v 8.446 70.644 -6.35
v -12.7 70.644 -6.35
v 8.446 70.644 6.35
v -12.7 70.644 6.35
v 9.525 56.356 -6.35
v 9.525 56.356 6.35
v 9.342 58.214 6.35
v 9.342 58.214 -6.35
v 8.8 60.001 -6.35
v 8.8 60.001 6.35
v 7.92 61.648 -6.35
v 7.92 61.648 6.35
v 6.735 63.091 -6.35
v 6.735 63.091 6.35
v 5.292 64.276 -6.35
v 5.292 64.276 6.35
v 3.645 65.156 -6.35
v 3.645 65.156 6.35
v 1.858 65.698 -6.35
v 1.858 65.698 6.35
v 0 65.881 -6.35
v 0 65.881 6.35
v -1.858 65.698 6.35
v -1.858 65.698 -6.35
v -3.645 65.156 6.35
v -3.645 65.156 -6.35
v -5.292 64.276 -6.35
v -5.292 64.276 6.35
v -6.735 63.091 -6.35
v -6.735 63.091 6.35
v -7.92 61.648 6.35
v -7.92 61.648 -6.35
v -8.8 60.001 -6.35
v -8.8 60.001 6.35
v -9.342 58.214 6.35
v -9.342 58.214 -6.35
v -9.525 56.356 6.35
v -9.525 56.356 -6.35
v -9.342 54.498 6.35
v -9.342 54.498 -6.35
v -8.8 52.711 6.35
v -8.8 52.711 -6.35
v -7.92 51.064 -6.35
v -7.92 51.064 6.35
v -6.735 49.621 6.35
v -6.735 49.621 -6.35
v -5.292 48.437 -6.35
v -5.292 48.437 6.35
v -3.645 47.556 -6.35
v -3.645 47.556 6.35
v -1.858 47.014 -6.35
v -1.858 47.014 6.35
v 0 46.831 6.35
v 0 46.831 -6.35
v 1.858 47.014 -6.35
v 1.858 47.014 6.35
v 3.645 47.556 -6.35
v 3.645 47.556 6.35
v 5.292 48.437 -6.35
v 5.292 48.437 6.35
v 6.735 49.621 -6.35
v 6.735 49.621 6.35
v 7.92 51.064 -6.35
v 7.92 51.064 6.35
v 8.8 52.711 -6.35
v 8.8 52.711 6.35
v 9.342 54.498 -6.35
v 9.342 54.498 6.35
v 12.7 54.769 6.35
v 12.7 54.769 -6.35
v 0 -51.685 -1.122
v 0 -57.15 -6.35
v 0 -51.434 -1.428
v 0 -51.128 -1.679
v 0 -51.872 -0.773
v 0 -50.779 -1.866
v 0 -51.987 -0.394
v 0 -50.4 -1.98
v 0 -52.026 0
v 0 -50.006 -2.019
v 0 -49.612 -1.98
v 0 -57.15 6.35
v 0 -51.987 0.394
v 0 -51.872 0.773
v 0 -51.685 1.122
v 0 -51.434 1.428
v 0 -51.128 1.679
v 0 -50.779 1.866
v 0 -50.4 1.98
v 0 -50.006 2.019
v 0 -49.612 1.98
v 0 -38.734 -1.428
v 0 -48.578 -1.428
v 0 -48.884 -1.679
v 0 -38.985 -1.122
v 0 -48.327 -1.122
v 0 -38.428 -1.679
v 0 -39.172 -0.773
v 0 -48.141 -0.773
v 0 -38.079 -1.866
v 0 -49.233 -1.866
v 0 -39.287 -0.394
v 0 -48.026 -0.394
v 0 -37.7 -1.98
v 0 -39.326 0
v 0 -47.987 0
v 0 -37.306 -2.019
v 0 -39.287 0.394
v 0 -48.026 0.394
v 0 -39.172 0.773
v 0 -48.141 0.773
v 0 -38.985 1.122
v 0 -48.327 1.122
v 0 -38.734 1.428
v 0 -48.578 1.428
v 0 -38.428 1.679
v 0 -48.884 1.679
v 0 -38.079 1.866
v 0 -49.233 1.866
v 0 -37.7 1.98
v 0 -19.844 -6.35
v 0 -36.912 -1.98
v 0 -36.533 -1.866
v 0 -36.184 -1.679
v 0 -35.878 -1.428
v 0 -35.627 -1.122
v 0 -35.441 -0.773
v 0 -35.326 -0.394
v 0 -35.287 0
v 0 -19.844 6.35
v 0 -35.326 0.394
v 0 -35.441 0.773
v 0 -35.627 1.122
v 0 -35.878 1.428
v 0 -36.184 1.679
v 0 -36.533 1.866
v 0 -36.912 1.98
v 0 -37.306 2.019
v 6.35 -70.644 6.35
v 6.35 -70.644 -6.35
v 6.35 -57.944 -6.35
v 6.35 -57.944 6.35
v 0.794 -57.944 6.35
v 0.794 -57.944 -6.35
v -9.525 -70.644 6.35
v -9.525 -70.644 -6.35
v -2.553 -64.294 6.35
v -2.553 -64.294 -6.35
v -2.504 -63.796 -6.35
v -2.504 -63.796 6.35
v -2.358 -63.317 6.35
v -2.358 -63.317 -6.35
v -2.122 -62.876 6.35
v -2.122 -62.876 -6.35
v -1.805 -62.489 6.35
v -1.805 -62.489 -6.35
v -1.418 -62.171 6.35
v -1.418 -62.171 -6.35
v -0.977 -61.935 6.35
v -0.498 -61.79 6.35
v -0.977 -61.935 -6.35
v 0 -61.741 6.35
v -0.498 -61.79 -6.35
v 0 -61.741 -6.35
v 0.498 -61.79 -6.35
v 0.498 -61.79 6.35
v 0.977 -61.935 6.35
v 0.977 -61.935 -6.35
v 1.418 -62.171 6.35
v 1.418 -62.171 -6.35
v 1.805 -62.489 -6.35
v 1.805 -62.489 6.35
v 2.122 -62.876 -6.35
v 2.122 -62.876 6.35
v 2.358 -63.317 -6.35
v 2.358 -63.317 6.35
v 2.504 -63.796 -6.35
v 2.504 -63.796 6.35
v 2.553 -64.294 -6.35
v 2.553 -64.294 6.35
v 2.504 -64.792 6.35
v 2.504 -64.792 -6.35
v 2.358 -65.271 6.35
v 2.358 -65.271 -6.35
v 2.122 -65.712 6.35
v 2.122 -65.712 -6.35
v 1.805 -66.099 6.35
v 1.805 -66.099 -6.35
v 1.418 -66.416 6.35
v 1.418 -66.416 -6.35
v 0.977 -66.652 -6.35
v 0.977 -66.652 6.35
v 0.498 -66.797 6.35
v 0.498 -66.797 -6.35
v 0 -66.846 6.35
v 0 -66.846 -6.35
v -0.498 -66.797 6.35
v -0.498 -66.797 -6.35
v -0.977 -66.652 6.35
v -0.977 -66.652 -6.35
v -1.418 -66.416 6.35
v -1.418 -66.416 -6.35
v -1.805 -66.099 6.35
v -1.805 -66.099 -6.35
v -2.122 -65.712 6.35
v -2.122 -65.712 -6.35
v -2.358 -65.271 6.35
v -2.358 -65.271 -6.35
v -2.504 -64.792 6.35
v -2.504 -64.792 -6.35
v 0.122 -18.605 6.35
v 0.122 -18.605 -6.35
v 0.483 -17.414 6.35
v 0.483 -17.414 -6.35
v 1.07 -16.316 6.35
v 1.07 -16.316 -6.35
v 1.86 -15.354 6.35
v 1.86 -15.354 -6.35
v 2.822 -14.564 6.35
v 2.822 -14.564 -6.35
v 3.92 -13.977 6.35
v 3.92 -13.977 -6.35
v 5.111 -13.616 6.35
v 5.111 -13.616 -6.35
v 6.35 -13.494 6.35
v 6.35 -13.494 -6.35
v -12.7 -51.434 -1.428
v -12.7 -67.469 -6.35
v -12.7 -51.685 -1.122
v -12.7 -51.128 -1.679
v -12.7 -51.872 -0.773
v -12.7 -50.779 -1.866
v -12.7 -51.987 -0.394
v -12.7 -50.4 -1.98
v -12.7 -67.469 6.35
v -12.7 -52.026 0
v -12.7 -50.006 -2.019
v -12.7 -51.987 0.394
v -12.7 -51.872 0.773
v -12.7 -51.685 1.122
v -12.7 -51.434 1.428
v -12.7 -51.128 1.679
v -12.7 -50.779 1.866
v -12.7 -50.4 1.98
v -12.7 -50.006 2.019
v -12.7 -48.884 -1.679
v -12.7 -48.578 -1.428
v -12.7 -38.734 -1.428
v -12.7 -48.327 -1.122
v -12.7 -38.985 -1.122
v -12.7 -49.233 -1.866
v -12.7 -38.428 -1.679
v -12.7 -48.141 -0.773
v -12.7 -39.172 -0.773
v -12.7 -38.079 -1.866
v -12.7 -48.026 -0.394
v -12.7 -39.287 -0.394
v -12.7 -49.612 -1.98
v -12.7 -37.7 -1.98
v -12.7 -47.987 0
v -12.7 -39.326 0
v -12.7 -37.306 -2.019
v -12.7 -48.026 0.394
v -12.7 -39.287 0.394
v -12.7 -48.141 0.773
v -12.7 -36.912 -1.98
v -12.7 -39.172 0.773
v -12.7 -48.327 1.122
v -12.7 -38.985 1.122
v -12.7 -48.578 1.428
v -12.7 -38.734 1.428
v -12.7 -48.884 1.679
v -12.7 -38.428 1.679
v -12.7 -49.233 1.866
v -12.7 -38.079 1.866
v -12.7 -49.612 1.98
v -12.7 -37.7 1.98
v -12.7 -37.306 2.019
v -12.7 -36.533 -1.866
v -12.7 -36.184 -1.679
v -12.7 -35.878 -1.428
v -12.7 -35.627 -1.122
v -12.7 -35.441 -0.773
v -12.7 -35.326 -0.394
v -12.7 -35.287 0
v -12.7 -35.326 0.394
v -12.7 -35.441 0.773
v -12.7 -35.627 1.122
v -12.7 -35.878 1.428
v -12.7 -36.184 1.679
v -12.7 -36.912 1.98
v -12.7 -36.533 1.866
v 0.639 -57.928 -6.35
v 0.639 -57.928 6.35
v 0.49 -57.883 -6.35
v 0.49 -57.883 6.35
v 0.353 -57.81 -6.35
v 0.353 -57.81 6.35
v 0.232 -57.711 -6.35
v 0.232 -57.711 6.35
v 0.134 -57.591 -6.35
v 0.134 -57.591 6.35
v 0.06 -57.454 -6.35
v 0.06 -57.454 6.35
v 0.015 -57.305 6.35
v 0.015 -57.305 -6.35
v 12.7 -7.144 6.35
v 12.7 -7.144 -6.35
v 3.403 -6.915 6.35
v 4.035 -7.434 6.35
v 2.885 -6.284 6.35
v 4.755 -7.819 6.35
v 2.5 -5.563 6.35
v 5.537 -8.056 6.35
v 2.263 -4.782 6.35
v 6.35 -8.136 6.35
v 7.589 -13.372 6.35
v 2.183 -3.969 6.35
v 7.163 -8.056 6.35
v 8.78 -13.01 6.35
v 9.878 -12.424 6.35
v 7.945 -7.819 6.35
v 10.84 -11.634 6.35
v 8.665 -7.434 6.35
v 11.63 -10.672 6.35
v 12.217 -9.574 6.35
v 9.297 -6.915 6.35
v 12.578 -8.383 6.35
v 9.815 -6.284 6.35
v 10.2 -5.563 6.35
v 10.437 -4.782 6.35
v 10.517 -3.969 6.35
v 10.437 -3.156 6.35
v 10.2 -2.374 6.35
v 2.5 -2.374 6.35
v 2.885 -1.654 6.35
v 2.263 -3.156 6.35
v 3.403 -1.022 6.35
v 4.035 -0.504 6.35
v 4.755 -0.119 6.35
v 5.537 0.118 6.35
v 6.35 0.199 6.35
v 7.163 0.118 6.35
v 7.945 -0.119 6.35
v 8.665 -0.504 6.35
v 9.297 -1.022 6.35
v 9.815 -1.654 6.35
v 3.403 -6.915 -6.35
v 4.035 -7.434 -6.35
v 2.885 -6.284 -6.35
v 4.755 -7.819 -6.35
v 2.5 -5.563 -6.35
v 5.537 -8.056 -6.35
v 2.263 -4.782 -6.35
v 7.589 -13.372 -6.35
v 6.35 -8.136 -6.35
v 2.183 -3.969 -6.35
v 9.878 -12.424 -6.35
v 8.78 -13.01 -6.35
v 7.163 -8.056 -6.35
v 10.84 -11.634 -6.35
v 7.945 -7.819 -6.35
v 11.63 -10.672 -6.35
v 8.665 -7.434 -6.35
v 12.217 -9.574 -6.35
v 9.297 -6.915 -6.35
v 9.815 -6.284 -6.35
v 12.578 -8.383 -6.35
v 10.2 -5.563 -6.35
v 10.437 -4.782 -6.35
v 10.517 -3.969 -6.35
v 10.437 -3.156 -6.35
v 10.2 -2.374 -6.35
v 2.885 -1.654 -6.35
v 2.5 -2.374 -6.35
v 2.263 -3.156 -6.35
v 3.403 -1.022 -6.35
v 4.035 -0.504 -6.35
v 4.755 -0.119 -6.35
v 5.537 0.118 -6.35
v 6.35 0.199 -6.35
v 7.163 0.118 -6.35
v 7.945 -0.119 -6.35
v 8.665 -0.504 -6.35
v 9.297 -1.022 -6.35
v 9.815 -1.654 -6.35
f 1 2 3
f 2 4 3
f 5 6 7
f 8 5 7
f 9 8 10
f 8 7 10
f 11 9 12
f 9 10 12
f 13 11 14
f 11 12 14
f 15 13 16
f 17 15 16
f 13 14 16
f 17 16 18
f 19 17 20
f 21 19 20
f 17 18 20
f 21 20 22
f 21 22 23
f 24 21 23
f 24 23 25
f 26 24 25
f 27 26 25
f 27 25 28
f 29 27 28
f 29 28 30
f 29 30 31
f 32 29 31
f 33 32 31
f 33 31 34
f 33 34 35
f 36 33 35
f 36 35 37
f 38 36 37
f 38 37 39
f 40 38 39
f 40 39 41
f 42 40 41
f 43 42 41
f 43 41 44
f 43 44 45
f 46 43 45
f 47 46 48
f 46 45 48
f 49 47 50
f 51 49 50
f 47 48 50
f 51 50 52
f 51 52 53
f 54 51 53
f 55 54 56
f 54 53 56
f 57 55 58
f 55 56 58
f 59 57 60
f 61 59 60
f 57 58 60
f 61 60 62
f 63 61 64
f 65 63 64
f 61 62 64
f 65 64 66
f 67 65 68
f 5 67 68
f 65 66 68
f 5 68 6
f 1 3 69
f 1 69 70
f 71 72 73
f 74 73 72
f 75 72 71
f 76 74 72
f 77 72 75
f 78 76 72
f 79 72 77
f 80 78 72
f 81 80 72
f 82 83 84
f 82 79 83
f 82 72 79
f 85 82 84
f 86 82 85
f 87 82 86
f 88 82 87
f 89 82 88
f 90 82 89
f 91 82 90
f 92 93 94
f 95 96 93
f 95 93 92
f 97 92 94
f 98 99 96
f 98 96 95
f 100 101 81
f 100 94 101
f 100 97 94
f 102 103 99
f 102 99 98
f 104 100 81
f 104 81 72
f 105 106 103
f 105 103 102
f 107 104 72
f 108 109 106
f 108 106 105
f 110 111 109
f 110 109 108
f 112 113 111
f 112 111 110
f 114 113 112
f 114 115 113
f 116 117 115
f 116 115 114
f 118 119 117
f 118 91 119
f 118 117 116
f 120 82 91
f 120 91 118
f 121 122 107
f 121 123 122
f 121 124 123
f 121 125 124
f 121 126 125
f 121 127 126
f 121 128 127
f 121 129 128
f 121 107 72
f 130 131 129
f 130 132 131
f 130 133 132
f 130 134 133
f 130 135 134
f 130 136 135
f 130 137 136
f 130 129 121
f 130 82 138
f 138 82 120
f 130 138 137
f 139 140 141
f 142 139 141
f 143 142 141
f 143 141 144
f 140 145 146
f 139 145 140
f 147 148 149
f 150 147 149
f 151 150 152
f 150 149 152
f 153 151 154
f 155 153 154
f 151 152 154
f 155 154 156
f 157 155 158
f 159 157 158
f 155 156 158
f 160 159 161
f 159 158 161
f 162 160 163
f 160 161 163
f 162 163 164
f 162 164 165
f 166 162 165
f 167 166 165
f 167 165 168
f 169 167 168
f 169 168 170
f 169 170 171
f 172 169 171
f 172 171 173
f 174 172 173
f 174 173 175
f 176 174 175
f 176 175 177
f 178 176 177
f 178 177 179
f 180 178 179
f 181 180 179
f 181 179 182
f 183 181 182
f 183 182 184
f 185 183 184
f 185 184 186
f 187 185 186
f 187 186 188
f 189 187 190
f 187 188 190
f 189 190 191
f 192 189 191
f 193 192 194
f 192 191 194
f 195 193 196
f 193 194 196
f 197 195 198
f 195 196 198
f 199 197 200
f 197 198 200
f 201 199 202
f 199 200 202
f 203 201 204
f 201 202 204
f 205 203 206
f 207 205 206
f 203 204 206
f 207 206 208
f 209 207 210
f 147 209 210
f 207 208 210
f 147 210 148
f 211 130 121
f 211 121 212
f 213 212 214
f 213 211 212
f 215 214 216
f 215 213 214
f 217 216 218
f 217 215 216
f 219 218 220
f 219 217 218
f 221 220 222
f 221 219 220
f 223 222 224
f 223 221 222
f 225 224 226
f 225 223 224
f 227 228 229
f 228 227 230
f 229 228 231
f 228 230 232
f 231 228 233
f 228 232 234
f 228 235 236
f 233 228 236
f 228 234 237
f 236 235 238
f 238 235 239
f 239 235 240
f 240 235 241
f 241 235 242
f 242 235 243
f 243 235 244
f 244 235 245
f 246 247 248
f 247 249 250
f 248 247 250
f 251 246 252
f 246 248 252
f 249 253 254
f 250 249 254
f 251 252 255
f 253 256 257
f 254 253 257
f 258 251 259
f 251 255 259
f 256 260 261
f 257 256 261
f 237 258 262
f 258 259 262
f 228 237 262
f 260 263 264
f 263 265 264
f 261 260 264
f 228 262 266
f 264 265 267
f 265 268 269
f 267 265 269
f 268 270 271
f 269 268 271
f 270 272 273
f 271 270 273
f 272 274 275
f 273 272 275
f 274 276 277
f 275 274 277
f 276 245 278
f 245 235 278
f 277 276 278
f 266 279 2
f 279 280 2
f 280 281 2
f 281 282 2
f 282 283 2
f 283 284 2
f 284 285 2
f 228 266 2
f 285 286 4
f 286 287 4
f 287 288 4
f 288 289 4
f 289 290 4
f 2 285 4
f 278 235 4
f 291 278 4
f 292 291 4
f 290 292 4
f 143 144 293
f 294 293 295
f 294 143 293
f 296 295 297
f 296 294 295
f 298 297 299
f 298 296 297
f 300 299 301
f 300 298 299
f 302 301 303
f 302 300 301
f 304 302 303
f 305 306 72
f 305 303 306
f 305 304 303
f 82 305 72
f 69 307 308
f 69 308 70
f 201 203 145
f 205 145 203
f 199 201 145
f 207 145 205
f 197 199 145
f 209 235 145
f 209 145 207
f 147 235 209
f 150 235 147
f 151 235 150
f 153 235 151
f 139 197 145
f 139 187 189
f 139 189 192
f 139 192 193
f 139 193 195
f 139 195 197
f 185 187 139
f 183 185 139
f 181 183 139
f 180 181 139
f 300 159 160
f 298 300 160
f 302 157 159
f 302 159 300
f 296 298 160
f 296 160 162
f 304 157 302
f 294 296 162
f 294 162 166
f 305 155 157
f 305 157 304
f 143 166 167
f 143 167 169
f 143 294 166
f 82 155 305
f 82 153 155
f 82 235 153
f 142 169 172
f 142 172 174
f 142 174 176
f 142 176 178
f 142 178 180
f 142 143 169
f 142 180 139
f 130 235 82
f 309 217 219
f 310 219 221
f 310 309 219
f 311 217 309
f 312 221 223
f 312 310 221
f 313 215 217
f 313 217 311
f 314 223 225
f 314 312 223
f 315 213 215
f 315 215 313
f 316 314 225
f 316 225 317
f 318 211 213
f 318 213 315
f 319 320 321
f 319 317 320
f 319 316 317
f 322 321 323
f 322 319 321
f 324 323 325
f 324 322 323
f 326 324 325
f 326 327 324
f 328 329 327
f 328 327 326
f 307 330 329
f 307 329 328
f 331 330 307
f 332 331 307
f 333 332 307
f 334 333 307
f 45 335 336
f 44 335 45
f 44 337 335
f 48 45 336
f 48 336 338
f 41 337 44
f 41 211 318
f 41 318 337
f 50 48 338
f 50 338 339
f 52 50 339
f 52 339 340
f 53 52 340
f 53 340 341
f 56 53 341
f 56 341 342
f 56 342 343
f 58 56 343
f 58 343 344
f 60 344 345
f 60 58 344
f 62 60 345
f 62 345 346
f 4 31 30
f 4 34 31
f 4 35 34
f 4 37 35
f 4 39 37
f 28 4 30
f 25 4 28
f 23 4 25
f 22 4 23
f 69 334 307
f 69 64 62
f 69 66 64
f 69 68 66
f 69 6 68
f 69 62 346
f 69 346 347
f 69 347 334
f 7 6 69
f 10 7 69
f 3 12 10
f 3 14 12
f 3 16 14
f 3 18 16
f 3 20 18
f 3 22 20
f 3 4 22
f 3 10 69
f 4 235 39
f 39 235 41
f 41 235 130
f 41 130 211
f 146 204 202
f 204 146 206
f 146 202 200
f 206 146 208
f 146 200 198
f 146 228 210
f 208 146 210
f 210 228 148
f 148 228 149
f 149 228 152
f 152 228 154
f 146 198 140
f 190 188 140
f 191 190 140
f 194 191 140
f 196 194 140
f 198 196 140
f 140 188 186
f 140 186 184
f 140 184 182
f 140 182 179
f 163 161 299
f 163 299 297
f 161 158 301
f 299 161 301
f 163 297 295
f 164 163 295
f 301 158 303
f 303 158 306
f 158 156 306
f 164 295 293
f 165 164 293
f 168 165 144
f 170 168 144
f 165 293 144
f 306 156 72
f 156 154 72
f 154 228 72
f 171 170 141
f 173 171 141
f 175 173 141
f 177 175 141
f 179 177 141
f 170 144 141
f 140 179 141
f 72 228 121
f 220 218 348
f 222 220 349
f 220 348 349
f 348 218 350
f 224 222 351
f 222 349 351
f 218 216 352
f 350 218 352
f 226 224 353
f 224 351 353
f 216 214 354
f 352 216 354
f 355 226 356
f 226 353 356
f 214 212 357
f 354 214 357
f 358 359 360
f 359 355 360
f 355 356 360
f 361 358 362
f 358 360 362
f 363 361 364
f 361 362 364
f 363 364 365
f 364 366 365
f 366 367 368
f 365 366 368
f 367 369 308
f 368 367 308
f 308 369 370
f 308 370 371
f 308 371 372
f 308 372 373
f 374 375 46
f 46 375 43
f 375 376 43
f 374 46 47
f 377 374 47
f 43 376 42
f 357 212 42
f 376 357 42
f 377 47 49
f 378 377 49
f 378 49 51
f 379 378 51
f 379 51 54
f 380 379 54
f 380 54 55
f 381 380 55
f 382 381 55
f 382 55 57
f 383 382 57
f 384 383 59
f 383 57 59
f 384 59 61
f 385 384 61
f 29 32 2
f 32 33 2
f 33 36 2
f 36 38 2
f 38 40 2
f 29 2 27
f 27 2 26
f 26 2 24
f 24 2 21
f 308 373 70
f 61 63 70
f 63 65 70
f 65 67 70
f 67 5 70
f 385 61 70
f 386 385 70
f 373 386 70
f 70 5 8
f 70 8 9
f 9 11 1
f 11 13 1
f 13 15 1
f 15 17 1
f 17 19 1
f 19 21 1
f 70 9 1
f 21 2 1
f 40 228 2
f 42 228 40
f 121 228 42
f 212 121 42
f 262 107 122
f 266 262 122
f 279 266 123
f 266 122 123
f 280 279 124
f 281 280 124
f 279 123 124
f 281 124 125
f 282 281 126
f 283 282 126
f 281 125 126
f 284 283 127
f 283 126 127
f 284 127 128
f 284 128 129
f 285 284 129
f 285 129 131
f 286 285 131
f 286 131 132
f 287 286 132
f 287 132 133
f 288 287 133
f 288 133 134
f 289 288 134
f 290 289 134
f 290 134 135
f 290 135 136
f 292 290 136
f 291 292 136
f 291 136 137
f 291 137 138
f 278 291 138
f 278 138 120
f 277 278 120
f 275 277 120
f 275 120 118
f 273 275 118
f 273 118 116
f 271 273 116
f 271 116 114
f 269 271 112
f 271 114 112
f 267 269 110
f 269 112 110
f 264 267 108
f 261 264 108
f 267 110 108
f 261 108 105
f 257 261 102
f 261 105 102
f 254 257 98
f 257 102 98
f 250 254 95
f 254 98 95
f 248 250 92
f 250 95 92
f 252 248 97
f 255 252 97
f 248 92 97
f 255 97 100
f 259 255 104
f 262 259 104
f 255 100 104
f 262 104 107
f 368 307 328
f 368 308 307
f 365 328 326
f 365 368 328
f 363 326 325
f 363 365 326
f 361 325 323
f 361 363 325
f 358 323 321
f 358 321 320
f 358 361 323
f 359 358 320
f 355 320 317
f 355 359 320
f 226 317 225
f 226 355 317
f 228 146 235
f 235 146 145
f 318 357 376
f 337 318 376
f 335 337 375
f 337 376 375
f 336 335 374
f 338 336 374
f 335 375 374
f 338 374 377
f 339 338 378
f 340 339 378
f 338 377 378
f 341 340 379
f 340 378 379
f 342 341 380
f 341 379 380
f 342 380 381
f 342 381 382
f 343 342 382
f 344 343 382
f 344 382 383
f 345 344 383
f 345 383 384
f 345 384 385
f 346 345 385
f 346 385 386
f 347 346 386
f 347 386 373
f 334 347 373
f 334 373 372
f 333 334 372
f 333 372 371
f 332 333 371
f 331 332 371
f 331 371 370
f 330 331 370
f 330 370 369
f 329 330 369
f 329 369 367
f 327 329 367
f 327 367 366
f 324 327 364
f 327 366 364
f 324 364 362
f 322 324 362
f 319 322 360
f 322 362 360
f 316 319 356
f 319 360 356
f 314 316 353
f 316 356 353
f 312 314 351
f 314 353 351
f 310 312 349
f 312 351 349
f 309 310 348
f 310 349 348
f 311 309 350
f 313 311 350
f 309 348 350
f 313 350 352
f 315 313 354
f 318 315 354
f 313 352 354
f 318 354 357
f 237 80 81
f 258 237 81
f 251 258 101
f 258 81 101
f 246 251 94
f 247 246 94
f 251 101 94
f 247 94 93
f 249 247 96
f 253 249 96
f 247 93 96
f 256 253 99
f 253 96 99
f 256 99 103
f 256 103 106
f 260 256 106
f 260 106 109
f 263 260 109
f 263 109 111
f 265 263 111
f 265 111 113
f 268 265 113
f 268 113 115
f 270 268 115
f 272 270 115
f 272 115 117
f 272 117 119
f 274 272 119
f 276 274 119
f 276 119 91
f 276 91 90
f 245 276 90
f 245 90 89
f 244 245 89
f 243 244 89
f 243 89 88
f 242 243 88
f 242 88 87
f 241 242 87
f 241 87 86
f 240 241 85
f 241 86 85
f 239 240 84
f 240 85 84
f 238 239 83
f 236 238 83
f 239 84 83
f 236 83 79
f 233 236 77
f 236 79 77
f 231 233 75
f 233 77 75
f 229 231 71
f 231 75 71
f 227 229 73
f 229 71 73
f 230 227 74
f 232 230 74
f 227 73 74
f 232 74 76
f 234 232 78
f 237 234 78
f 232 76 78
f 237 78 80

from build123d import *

# Parameters (mm, degrees)
SKETCH1_W                        = 25.4
SKETCH1_H                        = 141.2875
EXTRUDE1_DEPTH                   = 6.35
CUT_EXTRUDE1_REACH               = 74.891
SKETCH2_R                        = 9.525
CUT_EXTRUDE2_REACH               = 74.891
CHAMFER1_SIZE                    = 15.875
CHAMFER1_SIZE2                   = 4.25369343
F_21_64_0_32813_DIAMETER_HOLE1_D = 8.334502
F_1_4_20_TAPPED_HOLE1_D          = 5.1054
F_10_32_TAPPED_HOLE1_D           = 4.0386
F_10_32_TAPPED_HOLE1_DEPTH       = 13.716
F_10_32_TAPPED_HOLE1_TIP         = 1.213317848
FILLET1_R                        = 6.35
CHAMFER2_SIZE                    = 3.175


with BuildPart() as part:
    # Sketch1 → Extrude1 (new, symmetric)
    with BuildSketch(Plane.XY):
        Rectangle(SKETCH1_W, SKETCH1_H)
    extrude(amount=EXTRUDE1_DEPTH, both=True)

    # Sketch2 → Cut-Extrude1 (cut, up to next)
    with BuildSketch(Plane.XY.offset(6.35), mode=Mode.PRIVATE) as cut_extrude1_sk1:
        with Locations((0, 56.35625)):
            Circle(SKETCH2_R)
    cut_extrude1_tool1 = extrude(cut_extrude1_sk1.sketch, amount=-CUT_EXTRUDE1_REACH, mode=Mode.PRIVATE) & part.part
    add(cut_extrude1_tool1.solids().sort_by_distance((0, 56.35625, 6.35))[0], mode=Mode.SUBTRACT)

    # Sketch3 → Cut-Extrude2 (cut, up to next)
    with BuildSketch(Plane.XY.offset(6.35), mode=Mode.PRIVATE) as cut_extrude2_sk1:
        with BuildLine():
            Line((6.35, -57.94375), (0.79375, -57.94375))
            ThreePointArc((0.79375, -57.94375), (0.232483992, -57.711266008), (0, -57.15))
            Line((0, -57.15), (0, -19.84375))
            ThreePointArc((0, -19.84375), (1.859871939, -15.353621939), (6.35, -13.49375))
            Line((6.35, -13.49375), (12.7, -13.49375))
            Line((12.7, -13.49375), (12.7, -70.64375))
            Line((12.7, -70.64375), (6.35, -70.64375))
            Line((6.35, -70.64375), (6.35, -57.94375))
        make_face()
    cut_extrude2_tool1 = extrude(cut_extrude2_sk1.sketch, amount=-CUT_EXTRUDE2_REACH, mode=Mode.PRIVATE) & part.part
    add(cut_extrude2_tool1.solids().sort_by_distance((6.820727, -39.618194, 6.35))[0], mode=Mode.SUBTRACT)

    # Chamfer1
    chamfer1_edges = [part.edges().sort_by_distance(p)[0] for p in [
        (12.7, 70.64375, 0),
    ]]
    chamfer1_side = [part.faces().sort_by_distance(p)[0] for p in [
        (12.7, 28.575, 0),
    ]]
    chamfer(chamfer1_edges, length=CHAMFER1_SIZE, length2=CHAMFER1_SIZE2, reference=chamfer1_side[0])

    # 21/64 (0.32813) Diameter Hole1 (through all)
    with Locations(Plane.XY.offset(6.35)):
        with Locations((6.35, -3.96875)):
            Hole(F_21_64_0_32813_DIAMETER_HOLE1_D / 2)

    # 1/4-20 Tapped Hole1 (through all)
    with Locations(Plane.XY.offset(6.35)):
        with Locations((0, -64.29375)):
            Hole(F_1_4_20_TAPPED_HOLE1_D / 2)

    # #10-32 Tapped Hole1
    with Locations(Plane.ZY.offset(12.7)):
        with Locations((0, -50.00625), (0, -37.30625)):
            Hole(F_10_32_TAPPED_HOLE1_D / 2, depth=F_10_32_TAPPED_HOLE1_DEPTH)
            with Locations((0, 0, -(F_10_32_TAPPED_HOLE1_DEPTH + F_10_32_TAPPED_HOLE1_TIP / 2))):  # 118° drill point
                Cone(0, F_10_32_TAPPED_HOLE1_D / 2, F_10_32_TAPPED_HOLE1_TIP, mode=Mode.SUBTRACT)

    # Fillet1
    fillet1_edges = [part.edges().sort_by_distance(p)[0] for p in [
        (12.7, -13.49375, 0),
    ]]
    fillet(fillet1_edges, radius=FILLET1_R - 0.0001)  # a hair under: the kernel refuses the full size

    # Chamfer2
    chamfer2_edges = [part.edges().sort_by_distance(p)[0] for p in [
        (-12.7, -70.64375, 0),
    ]]
    chamfer(chamfer2_edges, length=CHAMFER2_SIZE)


solid = part.part
